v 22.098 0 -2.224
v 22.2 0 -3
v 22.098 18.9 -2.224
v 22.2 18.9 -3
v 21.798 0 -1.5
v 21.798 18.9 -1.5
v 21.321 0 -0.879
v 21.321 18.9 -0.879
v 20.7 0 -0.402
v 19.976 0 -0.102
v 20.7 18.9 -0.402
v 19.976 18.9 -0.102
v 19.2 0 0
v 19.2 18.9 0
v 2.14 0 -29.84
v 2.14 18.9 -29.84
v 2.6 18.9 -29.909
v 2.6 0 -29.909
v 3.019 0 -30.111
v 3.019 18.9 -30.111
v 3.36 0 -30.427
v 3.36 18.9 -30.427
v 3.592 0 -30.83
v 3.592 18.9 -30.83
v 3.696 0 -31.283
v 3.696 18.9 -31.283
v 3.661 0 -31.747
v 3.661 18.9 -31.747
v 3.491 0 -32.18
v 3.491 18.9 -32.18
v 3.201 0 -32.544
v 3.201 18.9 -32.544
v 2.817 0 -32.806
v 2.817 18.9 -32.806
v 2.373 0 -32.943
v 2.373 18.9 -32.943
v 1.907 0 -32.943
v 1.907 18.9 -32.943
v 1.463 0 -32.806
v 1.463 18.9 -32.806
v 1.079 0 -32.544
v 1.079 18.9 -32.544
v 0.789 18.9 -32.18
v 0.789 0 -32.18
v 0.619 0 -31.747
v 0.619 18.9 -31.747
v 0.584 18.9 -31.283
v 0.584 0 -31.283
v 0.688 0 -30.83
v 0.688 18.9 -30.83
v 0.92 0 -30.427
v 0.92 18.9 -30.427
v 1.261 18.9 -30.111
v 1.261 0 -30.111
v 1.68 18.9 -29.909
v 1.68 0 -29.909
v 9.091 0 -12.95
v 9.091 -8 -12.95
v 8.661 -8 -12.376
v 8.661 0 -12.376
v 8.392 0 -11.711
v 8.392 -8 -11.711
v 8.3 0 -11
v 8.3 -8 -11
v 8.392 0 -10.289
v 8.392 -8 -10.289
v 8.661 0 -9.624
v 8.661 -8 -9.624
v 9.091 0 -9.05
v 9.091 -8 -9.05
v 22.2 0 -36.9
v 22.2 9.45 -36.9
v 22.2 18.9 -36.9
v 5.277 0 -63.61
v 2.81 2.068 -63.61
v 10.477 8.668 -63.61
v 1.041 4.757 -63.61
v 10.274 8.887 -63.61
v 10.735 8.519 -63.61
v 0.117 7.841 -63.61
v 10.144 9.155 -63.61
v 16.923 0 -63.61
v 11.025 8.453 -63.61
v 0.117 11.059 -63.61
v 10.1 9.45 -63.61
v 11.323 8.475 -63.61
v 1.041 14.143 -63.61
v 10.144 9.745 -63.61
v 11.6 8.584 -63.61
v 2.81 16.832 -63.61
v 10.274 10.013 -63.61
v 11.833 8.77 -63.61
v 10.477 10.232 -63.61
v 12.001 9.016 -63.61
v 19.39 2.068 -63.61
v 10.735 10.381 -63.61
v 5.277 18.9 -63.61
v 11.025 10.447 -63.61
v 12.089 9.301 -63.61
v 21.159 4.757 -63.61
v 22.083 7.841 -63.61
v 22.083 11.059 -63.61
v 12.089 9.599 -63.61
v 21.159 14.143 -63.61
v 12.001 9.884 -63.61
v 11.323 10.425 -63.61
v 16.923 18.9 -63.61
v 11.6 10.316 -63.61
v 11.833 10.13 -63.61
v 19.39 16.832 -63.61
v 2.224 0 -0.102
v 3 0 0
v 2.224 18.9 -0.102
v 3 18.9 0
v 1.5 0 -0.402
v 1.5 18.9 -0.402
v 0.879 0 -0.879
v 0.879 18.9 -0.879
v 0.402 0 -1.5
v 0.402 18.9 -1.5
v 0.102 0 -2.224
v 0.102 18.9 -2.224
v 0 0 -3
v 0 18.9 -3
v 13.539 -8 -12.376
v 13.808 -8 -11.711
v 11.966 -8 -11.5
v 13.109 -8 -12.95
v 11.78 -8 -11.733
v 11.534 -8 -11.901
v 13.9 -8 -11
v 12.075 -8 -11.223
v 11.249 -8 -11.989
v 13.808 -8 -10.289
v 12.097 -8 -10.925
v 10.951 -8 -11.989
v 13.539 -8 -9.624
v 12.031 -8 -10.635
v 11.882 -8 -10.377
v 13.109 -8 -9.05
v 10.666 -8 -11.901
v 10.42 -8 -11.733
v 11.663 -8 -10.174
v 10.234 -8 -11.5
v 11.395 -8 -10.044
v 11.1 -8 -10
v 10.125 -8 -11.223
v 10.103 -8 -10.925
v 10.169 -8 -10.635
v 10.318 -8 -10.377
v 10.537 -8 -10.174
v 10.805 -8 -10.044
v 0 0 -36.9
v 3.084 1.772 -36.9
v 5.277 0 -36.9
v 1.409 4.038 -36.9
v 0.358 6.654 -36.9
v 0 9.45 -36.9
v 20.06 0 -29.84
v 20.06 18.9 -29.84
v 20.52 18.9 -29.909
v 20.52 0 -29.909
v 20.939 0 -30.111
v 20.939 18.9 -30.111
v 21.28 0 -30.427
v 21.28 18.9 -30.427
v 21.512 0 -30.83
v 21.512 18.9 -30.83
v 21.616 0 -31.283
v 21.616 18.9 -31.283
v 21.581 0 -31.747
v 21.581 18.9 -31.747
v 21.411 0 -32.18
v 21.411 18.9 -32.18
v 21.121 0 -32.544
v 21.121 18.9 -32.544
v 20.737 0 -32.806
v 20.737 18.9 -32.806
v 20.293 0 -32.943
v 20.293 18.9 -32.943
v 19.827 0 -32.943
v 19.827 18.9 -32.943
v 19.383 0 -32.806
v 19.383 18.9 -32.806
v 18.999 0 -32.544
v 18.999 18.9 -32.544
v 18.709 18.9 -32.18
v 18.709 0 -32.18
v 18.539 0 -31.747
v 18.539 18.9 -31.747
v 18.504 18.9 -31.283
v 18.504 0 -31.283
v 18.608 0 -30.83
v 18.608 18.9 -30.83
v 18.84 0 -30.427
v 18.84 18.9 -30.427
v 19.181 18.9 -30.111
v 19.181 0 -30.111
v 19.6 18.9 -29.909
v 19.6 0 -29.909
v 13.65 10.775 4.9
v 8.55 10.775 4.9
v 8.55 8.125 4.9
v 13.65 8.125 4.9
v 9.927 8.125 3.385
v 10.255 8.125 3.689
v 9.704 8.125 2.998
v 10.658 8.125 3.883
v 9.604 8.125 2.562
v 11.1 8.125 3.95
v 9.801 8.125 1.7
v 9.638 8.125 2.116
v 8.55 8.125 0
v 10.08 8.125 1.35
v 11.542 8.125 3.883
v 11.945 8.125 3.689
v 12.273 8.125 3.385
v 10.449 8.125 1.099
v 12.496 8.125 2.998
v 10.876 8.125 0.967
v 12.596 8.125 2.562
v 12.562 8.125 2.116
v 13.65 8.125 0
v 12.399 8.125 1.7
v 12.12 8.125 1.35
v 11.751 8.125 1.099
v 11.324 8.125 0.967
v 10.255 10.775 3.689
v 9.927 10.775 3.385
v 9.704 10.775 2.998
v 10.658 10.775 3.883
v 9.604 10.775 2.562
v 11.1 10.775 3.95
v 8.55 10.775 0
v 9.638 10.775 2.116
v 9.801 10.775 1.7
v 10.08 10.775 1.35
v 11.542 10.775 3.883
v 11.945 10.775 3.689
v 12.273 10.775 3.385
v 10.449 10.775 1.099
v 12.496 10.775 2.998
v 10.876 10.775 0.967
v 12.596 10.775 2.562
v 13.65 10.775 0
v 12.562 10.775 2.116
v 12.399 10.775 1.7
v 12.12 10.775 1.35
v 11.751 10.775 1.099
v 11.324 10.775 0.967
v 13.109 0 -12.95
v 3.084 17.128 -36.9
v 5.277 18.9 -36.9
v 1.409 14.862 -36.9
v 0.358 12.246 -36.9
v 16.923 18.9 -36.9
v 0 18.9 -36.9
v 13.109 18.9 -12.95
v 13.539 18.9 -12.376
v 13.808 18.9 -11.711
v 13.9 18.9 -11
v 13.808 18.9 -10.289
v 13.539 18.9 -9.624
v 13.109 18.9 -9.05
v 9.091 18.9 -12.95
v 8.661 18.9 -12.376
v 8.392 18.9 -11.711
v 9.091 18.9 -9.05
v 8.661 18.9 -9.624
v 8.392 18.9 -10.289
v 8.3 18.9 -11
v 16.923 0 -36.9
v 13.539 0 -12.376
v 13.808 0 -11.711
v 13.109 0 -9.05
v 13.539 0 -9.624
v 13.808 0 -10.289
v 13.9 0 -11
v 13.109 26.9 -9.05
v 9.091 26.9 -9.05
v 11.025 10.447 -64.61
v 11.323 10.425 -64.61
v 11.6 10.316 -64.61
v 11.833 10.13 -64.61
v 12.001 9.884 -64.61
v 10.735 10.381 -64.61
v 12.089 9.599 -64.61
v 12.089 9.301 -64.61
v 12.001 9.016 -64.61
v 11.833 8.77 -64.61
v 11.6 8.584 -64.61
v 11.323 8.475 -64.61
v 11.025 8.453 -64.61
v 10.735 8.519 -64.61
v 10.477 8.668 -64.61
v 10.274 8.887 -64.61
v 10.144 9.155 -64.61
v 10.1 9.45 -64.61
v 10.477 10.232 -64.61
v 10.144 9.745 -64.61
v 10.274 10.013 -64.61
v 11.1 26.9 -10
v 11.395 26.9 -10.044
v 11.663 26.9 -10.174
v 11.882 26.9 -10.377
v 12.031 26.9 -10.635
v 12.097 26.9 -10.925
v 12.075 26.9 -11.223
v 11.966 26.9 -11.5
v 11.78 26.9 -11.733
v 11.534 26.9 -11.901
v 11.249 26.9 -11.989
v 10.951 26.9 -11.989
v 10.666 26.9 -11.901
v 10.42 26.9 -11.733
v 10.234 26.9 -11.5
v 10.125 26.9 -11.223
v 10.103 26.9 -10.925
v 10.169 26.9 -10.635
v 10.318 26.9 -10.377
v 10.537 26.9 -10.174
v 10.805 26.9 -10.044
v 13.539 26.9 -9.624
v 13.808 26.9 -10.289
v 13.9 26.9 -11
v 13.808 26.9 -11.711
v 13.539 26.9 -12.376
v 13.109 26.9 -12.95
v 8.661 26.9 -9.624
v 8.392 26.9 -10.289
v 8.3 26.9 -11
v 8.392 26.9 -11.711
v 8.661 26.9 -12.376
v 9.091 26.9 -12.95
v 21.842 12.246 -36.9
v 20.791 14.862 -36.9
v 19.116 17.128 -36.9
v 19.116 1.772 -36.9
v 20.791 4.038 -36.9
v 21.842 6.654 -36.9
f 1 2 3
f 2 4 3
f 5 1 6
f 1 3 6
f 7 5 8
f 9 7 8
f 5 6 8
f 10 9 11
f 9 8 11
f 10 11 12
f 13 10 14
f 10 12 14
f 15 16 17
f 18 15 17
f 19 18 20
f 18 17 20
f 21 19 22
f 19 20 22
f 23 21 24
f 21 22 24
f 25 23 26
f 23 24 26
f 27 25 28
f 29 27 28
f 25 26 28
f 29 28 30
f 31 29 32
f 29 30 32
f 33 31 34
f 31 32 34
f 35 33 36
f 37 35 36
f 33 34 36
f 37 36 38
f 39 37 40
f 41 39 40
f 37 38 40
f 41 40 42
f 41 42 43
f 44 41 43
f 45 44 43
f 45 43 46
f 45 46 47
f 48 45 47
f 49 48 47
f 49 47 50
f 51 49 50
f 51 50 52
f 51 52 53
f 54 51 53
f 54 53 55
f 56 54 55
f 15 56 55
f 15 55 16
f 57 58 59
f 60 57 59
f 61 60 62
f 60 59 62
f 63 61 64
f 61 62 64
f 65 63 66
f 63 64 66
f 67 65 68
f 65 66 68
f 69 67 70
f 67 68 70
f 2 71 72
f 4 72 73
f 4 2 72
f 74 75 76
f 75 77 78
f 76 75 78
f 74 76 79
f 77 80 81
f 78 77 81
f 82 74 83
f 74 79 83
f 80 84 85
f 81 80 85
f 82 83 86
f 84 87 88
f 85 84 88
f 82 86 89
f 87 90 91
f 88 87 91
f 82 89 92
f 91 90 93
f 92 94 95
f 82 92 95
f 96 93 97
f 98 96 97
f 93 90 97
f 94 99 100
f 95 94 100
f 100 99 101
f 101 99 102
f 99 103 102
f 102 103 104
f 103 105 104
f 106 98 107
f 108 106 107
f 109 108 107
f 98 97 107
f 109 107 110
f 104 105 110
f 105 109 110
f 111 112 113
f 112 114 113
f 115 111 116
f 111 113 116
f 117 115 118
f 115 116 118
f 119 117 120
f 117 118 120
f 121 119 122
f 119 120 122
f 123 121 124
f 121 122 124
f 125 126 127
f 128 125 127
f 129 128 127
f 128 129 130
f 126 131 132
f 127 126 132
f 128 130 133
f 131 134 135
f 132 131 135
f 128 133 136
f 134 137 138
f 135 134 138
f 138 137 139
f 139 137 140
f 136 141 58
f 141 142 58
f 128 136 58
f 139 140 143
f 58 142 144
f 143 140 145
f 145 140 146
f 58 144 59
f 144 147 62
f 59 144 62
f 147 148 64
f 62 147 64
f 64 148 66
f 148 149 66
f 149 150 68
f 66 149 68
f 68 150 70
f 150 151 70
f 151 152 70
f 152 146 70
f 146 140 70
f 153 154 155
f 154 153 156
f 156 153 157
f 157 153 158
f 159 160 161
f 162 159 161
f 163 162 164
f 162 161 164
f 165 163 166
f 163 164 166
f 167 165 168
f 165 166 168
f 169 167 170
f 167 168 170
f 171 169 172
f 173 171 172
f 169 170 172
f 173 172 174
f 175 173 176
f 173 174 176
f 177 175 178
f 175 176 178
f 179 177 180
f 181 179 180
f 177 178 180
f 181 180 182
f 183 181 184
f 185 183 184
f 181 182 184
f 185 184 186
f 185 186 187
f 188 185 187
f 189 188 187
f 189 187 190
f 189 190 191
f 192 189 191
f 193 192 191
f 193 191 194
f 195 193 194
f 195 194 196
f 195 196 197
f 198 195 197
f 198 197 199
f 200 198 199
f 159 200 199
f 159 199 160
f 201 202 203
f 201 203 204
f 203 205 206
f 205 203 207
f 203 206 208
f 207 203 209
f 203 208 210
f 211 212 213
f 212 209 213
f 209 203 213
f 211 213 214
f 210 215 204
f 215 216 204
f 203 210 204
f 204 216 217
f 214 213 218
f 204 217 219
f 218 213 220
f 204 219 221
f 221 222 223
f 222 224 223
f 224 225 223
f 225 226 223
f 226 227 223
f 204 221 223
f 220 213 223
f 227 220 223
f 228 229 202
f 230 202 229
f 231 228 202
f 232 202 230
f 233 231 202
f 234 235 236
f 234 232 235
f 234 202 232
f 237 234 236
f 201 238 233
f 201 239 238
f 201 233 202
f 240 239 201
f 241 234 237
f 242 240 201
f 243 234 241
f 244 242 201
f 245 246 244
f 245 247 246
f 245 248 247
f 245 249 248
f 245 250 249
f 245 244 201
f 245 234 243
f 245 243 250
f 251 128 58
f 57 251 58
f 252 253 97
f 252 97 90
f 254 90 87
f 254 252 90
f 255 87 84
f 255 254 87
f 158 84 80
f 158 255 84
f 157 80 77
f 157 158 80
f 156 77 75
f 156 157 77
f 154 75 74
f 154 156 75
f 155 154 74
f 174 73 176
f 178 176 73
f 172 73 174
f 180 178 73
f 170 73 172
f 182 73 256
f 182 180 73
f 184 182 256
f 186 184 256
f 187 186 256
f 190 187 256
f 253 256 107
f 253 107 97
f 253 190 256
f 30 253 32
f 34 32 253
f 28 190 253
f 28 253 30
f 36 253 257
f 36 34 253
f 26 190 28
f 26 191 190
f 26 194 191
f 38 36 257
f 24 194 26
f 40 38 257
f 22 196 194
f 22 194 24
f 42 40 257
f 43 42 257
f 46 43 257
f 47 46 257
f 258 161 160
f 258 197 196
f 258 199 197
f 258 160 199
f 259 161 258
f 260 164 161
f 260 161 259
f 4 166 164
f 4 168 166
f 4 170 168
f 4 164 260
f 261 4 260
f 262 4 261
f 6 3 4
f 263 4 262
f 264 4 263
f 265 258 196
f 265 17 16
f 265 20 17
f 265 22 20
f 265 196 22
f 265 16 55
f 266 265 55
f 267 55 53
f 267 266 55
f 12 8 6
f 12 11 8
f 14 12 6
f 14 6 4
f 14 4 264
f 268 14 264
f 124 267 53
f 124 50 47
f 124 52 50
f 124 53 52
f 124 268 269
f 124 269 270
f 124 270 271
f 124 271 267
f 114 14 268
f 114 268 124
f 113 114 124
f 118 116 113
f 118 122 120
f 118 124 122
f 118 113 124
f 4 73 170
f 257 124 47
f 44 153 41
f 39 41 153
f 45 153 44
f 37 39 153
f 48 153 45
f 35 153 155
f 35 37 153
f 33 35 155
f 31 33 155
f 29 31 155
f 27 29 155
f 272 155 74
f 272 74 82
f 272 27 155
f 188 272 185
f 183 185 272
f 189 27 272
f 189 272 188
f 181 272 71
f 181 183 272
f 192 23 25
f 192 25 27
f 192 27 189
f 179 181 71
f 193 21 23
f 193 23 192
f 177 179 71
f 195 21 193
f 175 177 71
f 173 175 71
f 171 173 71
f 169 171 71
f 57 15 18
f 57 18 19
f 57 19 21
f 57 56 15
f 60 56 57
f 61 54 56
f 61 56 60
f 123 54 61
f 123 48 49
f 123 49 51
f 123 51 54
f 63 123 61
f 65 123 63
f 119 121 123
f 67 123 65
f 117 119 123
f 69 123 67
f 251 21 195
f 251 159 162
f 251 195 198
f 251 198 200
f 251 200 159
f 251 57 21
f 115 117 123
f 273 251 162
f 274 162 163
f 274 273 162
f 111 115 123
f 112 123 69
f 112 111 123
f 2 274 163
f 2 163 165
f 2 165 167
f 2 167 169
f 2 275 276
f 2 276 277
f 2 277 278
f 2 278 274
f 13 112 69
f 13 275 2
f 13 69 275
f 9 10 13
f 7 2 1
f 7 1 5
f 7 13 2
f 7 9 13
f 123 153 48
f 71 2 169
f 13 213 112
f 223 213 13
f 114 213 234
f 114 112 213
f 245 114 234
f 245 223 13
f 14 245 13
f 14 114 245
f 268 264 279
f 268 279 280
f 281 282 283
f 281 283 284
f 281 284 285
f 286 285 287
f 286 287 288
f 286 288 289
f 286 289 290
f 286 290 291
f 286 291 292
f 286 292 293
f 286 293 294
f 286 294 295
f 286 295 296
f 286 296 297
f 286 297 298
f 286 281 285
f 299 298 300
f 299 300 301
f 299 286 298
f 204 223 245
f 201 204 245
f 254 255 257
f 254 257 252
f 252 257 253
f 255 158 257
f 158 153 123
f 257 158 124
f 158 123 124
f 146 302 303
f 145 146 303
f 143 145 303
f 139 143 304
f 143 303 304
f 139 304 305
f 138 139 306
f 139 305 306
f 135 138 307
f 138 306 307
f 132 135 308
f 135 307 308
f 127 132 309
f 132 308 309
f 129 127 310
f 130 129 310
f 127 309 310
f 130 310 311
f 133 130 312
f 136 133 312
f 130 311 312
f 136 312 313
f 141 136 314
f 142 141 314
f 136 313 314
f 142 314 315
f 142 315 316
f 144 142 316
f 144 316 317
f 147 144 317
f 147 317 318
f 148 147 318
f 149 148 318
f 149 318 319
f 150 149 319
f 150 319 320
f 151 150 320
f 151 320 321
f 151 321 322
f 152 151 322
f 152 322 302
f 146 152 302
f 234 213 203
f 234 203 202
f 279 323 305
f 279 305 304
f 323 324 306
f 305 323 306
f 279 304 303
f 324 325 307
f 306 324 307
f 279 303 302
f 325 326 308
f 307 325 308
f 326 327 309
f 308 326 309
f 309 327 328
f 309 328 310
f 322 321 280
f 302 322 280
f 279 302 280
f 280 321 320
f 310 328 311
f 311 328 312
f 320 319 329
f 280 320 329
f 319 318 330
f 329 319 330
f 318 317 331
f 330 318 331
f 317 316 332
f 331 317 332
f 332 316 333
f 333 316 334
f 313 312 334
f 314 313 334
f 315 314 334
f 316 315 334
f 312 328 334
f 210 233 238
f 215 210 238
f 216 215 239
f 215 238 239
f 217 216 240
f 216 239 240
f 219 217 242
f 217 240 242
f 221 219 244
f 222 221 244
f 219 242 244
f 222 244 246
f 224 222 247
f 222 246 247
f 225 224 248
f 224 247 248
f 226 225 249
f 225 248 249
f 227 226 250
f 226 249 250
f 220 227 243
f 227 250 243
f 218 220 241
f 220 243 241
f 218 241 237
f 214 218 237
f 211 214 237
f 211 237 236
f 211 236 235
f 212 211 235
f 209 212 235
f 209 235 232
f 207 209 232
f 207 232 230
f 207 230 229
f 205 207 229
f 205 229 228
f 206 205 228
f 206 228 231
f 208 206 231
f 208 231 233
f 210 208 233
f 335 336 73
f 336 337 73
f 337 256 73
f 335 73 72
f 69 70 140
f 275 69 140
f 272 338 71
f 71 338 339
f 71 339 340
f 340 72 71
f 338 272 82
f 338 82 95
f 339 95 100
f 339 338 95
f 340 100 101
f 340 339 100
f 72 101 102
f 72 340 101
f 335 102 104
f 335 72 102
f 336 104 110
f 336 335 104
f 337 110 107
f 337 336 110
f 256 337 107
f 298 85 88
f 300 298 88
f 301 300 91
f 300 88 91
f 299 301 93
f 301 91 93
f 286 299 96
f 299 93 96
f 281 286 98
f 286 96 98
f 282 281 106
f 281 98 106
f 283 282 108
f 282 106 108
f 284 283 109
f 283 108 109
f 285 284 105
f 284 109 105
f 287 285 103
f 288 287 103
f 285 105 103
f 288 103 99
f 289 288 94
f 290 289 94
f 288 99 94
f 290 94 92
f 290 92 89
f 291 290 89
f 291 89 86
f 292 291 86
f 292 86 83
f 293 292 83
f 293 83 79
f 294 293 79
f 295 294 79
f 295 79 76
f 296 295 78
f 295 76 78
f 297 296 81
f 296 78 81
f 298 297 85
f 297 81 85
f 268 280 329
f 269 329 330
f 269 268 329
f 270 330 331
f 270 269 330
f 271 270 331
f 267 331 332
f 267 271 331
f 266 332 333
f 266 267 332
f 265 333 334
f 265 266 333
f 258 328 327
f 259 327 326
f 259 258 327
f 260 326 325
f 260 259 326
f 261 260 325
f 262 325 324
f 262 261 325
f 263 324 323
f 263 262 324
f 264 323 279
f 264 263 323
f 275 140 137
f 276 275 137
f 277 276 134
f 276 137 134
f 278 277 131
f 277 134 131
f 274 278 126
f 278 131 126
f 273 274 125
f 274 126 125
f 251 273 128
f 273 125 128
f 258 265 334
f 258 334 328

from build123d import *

# Parameters (mm, degrees)
SKETCH1_W           = 22.2
SKETCH1_H           = 18.9
BOSS_EXTRUDE1_DEPTH = 36.9
SKETCH2_W           = 5.1
SKETCH2_H           = 2.65
BOSS_EXTRUDE2_DEPTH = 4.9
BOSS_EXTRUDE3_DEPTH = 26.71
SKETCH4_R           = 1
BOSS_EXTRUDE4_DEPTH = 1
BOSS_EXTRUDE5_DEPTH = 8
BOSS_EXTRUDE6_START = 8
BOSS_EXTRUDE6_DEPTH = 8
SKETCH8_R           = 1.5
CUT_EXTRUDE1_DEPTH  = 71.850495588
SKETCH9_R           = 1
CUT_EXTRUDE2_DEPTH  = 77.715722639
SKETCH10_R          = 1.56
CUT_EXTRUDE3_DEPTH  = 74.422762819
FILLET1_R           = 3


with BuildPart() as part:
    # Sketch1 → Boss-Extrude1 (new body)
    with BuildSketch(Plane.XY):
        with Locations((11.1, 9.45)):
            Rectangle(SKETCH1_W, SKETCH1_H)
    extrude(amount=-BOSS_EXTRUDE1_DEPTH)

    # Sketch2 → Boss-Extrude2 (add)
    with BuildSketch(Plane.XY):
        with Locations((11.1, 9.45)):
            Rectangle(SKETCH2_W, SKETCH2_H)
    extrude(amount=BOSS_EXTRUDE2_DEPTH)

    # Sketch3 → Boss-Extrude3 (add)
    with BuildSketch(Plane(origin=(0, 0, -36.9), x_dir=(-1, 0, 0), z_dir=(0, 0, -1))):
        with BuildLine():
            Line((-16.923014683, 18.9), (-5.276985317, 18.9))
            ThreePointArc((-5.276985317, 18.9), (0, 9.45), (-5.276985317, 0))
            Line((-5.276985317, 0), (-16.923014683, 0))
            ThreePointArc((-16.923014683, 0), (-22.2, 9.45), (-16.923014683, 18.9))
        make_face()
    extrude(amount=BOSS_EXTRUDE3_DEPTH)

    # Sketch4 → Boss-Extrude4 (add)
    with BuildSketch(Plane(origin=(0, 0, -63.61), x_dir=(-1, 0, 0), z_dir=(0, 0, -1))):
        with Locations((-11.1, 9.45)):
            Circle(SKETCH4_R)
    extrude(amount=BOSS_EXTRUDE4_DEPTH)

    # Sketch5 → Boss-Extrude5 (add)
    with BuildSketch(Plane(origin=(0, 18.9, 0), x_dir=(1, 0, 0), z_dir=(0, 1, 0))):
        with BuildLine():
            Line((9.09064687, 12.95), (13.10935313, 12.95))
            ThreePointArc((13.10935313, 12.95), (13.9, 11), (13.10935313, 9.05))
            Line((13.10935313, 9.05), (9.09064687, 9.05))
            ThreePointArc((9.09064687, 9.05), (8.3, 11), (9.09064687, 12.95))
        make_face()
    extrude(amount=BOSS_EXTRUDE5_DEPTH)

    # Sketch6 → Boss-Extrude6 (add)
    with BuildSketch(Plane.XZ.offset(BOSS_EXTRUDE6_START)):
        with BuildLine():
            Line((9.09064687, -9.05), (13.10935313, -9.05))
            ThreePointArc((13.10935313, -9.05), (13.9, -11), (13.10935313, -12.95))
            Line((13.10935313, -12.95), (9.09064687, -12.95))
            ThreePointArc((9.09064687, -12.95), (8.3, -11), (9.09064687, -9.05))
        make_face()
    extrude(amount=-BOSS_EXTRUDE6_DEPTH)

    # Sketch8 → Cut-Extrude1 (cut, through all)
    with BuildSketch(Plane(origin=(0, 10.775, 0), x_dir=(1, 0, 0), z_dir=(0, 1, 0))):
        with Locations(Location((11.1, -2.45, 0), (0, 0, 270))):
            Circle(SKETCH8_R)
    extrude(amount=-CUT_EXTRUDE1_DEPTH, mode=Mode.SUBTRACT)

    # Sketch9 → Cut-Extrude2 (cut, through all)
    with BuildSketch(Plane(origin=(0, 26.9, 0), x_dir=(1, 0, 0), z_dir=(0, 1, 0))):
        with Locations(Location((11.1, 11, 0), (0, 0, 270))):
            Circle(SKETCH9_R)
    extrude(amount=-CUT_EXTRUDE2_DEPTH, mode=Mode.SUBTRACT)

    # Sketch10 → Cut-Extrude3 (cut, through all)
    with BuildSketch(Plane(origin=(0, 18.9, 0), x_dir=(1, 0, 0), z_dir=(0, 1, 0))):
        with Locations(Location((2.14, 31.4, 0), (0, 0, 270))):
            Circle(SKETCH10_R)
        with Locations(Location((20.06, 31.4, 0), (0, 0, 270))):
            Circle(SKETCH10_R)
    extrude(amount=-CUT_EXTRUDE3_DEPTH, mode=Mode.SUBTRACT)

    # Fillet1
    fillet1_edges = [part.edges().sort_by_distance(p)[0] for p in [
        (22.2, 9.45, 0),
        (0, 9.45, 0),
    ]]
    fillet(fillet1_edges, radius=FILLET1_R)


solid = part.part
